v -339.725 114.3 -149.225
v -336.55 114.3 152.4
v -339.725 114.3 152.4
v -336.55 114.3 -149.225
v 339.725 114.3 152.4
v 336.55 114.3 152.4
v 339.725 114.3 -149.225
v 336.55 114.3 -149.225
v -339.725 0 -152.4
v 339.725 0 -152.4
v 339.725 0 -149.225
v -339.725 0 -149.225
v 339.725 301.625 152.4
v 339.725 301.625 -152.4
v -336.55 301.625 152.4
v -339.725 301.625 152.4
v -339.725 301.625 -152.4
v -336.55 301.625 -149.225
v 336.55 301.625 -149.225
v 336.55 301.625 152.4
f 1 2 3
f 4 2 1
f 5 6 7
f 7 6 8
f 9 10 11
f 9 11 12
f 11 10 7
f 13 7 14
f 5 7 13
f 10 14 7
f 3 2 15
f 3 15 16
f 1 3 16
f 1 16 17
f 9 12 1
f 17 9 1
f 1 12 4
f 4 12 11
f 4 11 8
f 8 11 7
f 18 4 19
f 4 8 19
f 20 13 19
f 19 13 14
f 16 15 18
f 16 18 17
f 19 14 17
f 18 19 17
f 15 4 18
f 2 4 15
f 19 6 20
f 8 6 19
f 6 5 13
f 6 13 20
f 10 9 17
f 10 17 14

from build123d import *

# Parameters (mm, degrees)
EXTRUDE_THIN1_DEPTH     = 301.625
SKETCH2_W               = 301.625
SKETCH2_H               = 114.3
CUT_EXTRUDE1_DEPTH      = 677.275
CUT_EXTRUDE1_DEPTH_BACK = 4.175


with BuildPart() as part:
    # Sketch1 → Extrude-Thin1 (new body)
    with BuildSketch(Plane(origin=(0, 0, 0), x_dir=(1, 0, 0), z_dir=(0, 1, 0))):
        Polygon((-339.725, -152.4), (-339.725, 152.4), (339.725, 152.4), (339.725, -152.4), (336.55, -152.4), (336.55, 149.225), (-336.55, 149.225), (-336.55, -152.4), align=None)
    extrude(amount=EXTRUDE_THIN1_DEPTH)

    # Sketch2 → Cut-Extrude1 (cut, two sides)
    with BuildSketch(Plane(origin=(-336.55, 0, 0), x_dir=(0, 0, -1), z_dir=(1, 0, 0))) as cut_extrude1_sk:
        with Locations((-1.5875, 57.15)):
            Rectangle(SKETCH2_W, SKETCH2_H)
    extrude(amount=CUT_EXTRUDE1_DEPTH, mode=Mode.SUBTRACT)
    extrude(cut_extrude1_sk.sketch, amount=-CUT_EXTRUDE1_DEPTH_BACK, mode=Mode.SUBTRACT)


solid = part.part
